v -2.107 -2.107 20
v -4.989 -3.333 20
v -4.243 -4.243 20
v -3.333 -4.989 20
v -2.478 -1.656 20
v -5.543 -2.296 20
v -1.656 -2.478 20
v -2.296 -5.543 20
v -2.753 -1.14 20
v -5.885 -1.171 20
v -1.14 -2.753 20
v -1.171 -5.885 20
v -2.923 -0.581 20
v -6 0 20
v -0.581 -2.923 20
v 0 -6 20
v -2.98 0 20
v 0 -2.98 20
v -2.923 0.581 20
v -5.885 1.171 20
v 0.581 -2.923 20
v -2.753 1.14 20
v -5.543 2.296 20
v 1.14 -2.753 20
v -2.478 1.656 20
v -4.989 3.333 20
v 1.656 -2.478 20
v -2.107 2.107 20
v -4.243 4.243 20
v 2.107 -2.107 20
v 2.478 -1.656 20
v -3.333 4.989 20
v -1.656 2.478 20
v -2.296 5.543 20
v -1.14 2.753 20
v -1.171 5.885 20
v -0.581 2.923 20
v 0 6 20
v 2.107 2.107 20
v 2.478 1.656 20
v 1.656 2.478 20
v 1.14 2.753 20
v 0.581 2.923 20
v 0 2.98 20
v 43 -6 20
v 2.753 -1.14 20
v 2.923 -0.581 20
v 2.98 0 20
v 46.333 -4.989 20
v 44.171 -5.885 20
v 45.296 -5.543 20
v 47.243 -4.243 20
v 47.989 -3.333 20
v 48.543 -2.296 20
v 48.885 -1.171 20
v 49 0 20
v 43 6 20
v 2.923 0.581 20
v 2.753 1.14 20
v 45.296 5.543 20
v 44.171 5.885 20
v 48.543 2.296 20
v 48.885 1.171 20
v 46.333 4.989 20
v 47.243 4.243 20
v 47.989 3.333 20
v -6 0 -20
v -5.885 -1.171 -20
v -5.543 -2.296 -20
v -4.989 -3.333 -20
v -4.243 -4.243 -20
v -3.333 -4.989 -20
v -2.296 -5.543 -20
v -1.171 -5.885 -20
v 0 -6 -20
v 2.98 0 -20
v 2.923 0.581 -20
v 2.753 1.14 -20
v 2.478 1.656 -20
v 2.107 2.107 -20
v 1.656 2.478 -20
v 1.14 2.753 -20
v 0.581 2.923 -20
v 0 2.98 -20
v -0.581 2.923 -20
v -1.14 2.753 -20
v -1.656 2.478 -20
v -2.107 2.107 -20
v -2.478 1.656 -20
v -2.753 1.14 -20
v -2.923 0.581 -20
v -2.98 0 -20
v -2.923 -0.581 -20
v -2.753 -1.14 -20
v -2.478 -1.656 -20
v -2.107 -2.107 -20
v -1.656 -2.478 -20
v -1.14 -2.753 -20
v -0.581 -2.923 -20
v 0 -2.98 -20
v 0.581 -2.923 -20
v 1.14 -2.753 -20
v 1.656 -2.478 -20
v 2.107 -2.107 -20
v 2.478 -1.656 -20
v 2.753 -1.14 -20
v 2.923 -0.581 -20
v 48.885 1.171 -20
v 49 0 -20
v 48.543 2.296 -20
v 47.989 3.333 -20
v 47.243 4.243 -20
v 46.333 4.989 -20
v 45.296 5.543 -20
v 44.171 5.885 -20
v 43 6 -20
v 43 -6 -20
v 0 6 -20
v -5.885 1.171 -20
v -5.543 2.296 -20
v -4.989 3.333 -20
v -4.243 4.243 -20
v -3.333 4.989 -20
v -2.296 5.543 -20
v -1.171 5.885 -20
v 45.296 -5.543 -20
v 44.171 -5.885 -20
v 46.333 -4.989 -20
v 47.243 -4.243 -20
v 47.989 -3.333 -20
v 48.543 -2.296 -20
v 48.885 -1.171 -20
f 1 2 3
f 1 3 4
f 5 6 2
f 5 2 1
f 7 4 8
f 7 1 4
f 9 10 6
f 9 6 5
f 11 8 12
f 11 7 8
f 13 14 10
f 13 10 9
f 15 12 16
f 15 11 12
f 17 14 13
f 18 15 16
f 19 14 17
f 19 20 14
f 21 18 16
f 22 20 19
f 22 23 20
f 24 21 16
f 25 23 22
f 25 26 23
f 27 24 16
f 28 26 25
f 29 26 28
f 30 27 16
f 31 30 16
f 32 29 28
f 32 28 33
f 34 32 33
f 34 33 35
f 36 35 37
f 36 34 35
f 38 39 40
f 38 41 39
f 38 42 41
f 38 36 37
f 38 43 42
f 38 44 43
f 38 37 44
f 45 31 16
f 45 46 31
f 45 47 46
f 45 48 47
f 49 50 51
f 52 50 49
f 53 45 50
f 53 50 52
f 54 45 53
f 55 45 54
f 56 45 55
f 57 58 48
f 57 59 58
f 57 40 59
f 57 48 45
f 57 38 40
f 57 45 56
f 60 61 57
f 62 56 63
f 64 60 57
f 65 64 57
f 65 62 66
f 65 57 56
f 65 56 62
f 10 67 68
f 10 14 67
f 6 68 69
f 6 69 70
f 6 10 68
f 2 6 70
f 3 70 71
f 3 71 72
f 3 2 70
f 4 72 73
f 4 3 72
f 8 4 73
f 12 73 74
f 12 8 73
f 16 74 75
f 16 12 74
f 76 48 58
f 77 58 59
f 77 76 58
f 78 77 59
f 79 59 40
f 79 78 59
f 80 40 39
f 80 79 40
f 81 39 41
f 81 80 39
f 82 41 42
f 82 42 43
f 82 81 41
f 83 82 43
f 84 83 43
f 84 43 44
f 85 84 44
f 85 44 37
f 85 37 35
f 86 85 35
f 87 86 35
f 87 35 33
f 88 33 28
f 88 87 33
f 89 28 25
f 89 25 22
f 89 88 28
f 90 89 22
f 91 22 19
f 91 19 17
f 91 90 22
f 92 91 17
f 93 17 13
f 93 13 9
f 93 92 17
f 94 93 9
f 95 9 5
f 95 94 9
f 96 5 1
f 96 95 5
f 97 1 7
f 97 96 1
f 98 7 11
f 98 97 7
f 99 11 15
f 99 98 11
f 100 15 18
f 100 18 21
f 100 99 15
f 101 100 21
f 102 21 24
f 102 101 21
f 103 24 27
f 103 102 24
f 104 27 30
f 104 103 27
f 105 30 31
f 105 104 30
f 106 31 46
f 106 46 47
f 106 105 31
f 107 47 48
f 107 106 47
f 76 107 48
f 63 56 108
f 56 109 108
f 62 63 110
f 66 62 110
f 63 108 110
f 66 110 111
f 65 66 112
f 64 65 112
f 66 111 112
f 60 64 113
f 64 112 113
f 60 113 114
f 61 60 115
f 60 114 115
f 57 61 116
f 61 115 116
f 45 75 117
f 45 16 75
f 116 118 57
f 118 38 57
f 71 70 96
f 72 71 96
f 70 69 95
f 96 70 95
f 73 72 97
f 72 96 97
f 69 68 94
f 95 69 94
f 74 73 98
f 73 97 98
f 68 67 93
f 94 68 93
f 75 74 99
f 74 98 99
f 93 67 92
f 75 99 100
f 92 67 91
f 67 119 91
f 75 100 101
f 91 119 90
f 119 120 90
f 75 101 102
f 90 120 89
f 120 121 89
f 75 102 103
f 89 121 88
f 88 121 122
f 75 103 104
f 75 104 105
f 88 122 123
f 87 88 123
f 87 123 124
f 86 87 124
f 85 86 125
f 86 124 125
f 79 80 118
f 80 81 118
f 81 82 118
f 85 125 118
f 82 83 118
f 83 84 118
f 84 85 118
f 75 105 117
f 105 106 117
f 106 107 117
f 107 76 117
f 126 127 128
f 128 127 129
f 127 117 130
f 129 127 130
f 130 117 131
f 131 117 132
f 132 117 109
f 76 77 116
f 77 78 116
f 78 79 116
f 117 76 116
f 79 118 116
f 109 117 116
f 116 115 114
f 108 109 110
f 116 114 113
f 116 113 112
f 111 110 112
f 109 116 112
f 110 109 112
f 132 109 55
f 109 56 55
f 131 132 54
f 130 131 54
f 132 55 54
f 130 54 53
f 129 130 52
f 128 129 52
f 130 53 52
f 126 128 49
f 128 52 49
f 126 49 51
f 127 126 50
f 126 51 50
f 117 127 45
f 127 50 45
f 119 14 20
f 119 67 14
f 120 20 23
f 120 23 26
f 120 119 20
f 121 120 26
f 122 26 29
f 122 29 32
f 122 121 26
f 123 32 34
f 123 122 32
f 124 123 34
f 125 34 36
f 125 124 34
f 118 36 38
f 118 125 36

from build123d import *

# Parameters (mm, degrees)
SKETCH1_W           = 55
SKETCH1_H           = 12
SKETCH1_R           = 2.98
BOSS_EXTRUDE1_DEPTH = 20
FILLET2_R           = 6


with BuildPart() as part:
    # Sketch1 → Boss-Extrude1 (new, symmetric)
    with BuildSketch(Plane.XY):
        with Locations((21.5, 0)):
            Rectangle(SKETCH1_W, SKETCH1_H)
        Circle(SKETCH1_R, mode=Mode.SUBTRACT)
    extrude(amount=BOSS_EXTRUDE1_DEPTH, both=True)

    # Fillet2
    fillet2_edges = [part.edges().sort_by_distance(p)[0] for p in [
        (49, -6, 0),
        (49, 6, 0),
        (-6, -6, 0),
        (-6, 6, 0),
    ]]
    fillet(fillet2_edges, radius=FILLET2_R - 0.0001)  # a hair under: the kernel refuses the full size


solid = part.part
